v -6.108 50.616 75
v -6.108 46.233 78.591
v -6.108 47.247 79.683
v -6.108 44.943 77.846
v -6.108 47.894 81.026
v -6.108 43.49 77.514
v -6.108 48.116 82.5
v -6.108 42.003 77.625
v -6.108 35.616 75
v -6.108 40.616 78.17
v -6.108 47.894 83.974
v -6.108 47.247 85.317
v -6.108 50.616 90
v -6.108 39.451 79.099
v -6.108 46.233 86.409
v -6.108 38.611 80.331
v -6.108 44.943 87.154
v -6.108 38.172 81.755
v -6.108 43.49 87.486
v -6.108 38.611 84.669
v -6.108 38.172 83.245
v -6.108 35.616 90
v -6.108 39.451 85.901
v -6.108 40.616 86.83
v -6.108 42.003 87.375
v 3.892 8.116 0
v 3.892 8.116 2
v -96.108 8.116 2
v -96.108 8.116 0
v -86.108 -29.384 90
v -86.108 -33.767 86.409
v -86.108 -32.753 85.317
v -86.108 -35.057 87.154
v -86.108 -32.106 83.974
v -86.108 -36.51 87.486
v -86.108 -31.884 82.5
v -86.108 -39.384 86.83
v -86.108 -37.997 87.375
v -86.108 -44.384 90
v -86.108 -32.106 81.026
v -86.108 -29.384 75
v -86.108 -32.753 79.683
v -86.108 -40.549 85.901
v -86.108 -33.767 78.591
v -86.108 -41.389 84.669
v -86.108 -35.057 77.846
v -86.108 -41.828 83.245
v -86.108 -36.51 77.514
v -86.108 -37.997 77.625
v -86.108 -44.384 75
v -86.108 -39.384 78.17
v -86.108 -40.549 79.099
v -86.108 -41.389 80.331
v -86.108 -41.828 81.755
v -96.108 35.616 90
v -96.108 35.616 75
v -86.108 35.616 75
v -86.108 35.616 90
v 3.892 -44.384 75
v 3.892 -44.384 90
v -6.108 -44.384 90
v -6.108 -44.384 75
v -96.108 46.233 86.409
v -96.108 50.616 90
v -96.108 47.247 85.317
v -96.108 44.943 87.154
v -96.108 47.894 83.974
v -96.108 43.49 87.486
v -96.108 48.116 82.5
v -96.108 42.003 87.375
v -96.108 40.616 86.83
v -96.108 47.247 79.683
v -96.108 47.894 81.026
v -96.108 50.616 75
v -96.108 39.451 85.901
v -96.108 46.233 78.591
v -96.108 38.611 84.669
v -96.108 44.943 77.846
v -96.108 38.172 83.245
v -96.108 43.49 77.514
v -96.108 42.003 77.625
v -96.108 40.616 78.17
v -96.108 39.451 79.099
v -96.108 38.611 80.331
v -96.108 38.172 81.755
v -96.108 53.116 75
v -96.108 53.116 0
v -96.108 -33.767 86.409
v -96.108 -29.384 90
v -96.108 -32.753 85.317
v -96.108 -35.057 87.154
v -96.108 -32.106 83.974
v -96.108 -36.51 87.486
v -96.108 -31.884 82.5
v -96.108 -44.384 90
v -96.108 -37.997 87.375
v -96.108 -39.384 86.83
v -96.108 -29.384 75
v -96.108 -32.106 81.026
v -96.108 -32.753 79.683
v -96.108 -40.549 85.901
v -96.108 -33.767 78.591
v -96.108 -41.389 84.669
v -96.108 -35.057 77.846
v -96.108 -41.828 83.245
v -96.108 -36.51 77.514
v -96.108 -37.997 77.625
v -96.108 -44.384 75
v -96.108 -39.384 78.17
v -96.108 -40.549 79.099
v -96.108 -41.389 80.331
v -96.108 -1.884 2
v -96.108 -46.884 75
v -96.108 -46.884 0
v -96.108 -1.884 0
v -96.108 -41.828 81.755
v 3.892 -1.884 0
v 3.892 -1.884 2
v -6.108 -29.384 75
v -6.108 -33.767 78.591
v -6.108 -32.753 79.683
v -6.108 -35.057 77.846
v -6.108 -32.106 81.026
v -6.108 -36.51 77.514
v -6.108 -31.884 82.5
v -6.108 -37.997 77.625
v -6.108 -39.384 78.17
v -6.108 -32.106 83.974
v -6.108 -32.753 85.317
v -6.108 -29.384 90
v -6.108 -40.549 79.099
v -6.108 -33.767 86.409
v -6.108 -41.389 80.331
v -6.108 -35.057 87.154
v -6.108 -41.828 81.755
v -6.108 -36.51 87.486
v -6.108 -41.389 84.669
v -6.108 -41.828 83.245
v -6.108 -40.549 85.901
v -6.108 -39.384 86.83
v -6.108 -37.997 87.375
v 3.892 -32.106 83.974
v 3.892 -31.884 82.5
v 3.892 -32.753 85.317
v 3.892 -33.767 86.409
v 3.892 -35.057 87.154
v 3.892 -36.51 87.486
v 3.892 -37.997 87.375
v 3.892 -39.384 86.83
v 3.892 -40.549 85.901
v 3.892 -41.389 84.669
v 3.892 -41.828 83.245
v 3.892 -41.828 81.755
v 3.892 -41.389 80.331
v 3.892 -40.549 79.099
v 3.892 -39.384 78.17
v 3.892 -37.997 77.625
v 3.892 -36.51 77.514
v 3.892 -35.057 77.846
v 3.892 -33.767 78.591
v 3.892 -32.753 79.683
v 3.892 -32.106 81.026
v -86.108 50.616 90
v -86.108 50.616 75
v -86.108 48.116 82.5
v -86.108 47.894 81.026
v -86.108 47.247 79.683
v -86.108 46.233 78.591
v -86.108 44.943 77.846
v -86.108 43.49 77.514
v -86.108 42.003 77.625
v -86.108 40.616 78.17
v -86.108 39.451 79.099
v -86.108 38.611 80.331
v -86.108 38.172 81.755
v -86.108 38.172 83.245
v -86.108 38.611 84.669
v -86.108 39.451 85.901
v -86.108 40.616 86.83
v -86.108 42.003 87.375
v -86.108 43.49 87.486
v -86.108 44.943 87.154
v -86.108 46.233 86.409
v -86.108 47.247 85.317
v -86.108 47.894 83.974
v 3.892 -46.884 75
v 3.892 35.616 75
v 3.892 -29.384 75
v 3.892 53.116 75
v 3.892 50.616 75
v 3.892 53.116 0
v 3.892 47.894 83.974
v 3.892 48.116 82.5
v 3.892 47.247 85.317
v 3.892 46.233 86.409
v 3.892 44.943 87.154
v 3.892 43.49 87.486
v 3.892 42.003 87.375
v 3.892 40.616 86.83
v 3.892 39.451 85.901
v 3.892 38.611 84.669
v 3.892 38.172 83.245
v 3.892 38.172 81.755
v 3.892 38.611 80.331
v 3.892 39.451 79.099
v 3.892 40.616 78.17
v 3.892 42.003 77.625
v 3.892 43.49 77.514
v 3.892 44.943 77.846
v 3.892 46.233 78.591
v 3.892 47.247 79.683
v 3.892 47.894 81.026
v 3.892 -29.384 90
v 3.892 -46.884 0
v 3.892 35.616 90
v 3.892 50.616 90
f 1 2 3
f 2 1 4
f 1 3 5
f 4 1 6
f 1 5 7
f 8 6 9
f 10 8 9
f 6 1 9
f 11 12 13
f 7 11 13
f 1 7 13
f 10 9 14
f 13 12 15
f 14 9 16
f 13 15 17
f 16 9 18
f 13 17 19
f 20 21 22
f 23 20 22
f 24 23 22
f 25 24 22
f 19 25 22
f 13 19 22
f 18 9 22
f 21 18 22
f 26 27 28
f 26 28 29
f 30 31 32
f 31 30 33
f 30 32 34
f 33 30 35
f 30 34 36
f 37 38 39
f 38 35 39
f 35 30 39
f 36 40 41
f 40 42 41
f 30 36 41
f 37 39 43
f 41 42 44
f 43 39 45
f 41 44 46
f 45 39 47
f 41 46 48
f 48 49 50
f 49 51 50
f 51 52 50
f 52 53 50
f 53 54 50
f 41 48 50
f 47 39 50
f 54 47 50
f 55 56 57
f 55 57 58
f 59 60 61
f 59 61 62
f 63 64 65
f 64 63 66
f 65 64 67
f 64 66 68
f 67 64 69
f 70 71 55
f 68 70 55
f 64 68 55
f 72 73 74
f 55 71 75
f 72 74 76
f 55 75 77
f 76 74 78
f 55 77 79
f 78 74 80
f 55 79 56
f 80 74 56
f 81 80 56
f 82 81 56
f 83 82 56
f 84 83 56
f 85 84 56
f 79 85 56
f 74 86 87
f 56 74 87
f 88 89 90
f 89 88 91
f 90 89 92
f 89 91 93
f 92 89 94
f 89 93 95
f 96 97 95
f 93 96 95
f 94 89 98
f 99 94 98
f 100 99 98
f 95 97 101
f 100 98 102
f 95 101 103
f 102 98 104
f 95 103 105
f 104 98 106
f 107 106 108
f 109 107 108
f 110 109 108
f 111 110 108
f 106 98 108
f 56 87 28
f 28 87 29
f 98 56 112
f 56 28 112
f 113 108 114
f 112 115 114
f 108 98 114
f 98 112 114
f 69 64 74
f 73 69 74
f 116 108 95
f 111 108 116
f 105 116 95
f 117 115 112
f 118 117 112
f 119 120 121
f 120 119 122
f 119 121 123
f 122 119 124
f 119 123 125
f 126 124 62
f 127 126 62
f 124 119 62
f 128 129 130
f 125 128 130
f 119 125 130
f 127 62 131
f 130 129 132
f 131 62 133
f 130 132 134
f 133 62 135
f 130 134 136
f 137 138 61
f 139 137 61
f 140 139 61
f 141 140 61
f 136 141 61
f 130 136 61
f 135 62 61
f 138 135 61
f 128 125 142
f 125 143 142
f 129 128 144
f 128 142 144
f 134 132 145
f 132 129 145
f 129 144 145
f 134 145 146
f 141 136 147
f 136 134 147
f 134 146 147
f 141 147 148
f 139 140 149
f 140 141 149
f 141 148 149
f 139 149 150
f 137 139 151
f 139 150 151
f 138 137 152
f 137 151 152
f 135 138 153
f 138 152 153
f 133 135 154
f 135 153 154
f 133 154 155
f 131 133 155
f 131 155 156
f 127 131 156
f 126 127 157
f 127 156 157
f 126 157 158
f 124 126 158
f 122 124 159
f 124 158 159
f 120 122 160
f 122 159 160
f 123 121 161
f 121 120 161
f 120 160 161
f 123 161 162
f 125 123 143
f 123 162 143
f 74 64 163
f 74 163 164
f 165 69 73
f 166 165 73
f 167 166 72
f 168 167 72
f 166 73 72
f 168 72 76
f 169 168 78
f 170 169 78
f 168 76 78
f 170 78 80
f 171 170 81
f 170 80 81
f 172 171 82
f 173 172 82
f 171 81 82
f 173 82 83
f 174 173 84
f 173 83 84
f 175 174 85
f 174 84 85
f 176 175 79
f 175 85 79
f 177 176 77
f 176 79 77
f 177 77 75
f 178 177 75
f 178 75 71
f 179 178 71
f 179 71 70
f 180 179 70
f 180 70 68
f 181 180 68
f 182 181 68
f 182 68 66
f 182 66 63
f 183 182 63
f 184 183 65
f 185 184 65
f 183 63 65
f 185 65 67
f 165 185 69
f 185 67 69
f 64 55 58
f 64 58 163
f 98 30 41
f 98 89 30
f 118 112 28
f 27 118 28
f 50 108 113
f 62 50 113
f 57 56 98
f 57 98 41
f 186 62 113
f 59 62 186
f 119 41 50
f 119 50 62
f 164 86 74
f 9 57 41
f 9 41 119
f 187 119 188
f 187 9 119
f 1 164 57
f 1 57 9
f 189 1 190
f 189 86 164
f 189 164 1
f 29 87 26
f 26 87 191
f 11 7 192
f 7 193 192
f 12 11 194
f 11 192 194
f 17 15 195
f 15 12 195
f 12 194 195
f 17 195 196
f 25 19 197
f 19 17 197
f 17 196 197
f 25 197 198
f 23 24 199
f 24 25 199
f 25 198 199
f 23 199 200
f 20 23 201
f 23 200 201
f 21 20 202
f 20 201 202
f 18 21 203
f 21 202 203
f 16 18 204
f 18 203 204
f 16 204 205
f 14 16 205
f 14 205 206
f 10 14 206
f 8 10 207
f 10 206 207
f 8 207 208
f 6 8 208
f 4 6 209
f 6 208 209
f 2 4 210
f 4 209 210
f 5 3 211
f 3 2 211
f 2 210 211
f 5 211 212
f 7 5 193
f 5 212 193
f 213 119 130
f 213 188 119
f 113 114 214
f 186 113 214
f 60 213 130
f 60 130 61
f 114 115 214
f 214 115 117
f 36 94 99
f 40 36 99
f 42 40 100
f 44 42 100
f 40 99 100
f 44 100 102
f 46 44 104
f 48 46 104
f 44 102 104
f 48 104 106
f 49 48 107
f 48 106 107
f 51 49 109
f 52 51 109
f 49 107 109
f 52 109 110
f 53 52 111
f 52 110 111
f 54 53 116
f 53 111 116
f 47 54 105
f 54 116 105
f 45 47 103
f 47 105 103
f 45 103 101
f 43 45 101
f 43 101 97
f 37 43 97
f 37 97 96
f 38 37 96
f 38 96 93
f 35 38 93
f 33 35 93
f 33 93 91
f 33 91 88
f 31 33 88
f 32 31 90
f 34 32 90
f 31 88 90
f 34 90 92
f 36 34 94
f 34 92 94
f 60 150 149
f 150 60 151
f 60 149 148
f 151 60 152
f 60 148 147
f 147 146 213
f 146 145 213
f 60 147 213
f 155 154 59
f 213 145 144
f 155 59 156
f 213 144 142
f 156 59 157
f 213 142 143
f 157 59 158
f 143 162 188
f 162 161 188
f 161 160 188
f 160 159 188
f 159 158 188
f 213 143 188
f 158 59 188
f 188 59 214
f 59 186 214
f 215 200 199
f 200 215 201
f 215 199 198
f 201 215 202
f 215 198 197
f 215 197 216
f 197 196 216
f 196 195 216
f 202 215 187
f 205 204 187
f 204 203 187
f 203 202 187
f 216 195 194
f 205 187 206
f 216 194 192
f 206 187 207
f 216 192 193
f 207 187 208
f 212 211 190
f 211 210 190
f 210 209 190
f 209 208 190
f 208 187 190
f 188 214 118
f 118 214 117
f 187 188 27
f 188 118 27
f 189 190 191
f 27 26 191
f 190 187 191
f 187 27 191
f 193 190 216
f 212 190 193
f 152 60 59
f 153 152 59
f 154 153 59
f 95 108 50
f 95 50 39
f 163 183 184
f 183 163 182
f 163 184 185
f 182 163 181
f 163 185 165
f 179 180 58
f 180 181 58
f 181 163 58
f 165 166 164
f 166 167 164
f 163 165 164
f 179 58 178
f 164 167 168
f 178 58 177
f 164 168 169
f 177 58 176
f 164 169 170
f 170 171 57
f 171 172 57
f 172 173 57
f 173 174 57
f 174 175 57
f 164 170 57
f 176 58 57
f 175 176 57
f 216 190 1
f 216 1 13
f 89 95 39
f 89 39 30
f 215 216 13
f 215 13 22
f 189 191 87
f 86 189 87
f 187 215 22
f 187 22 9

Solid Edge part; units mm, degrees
sketch "Sketch1" plane through (0, 0, 0) normal (0, 0, 1) x (1, 0, 0)
  line L0 (-96.1079, -46.8841) -> (3.8921, -46.8841)
  line L1 (3.8921, -46.8841) -> (3.8921, 53.1159)
  line L2 (3.8921, 53.1159) -> (-96.1079, 53.1159)
  line L3 (-96.1079, 53.1159) -> (-96.1079, -46.8841)
  dimension "D1" = 100
  dimension "D2" = 100
extrude "Protrusion1" add sketch "Sketch1" along normal blind 75
sketch "Sketch2" plane through (-96.1079, 3.1159, 2.5) normal (-1, 0, 0) x (0, 1, 0)
  circle A0 centre (-40, -80) radius 5
  line L0 (32.5, -87.5) -> (47.5, -87.5)
  line L1 (47.5, -87.5) -> (47.5, -72.5)
  line L2 (47.5, -72.5) -> (32.5, -72.5)
  line L3 (32.5, -72.5) -> (32.5, -87.5)
  circle A1 centre (40, -80) radius 5
  line L4 (-47.5, -87.5) -> (-32.5, -87.5)
  line L5 (-32.5, -87.5) -> (-32.5, -72.5)
  line L6 (-32.5, -72.5) -> (-47.5, -72.5)
  line L7 (-47.5, -72.5) -> (-47.5, -87.5)
  dimension "D1" = 15
  dimension "D2" = 15
  dimension "D3" = 40
  dimension "D4" = 10
  dimension "D5" = 15
  dimension "D6" = 15
  dimension "D7" = 40
  dimension "D8" = 10
extrude "ExtrudedProtrusion_2" add sketch "Sketch2" against normal blind 10
mirror "Mirror1" about plane through (-46.1079, 0, 0) normal (1, 0, 0) of "ExtrudedProtrusion_2"
sketch "Sketch3" plane through (-96.1079, 3.1159, 10) normal (-1, 0, 0) x (0, -1, 0)
  line L0 (-5, -10) -> (5, -10)
  line L1 (5, -10) -> (5, -8)
  line L2 (5, -8) -> (-5, -8)
  line L3 (-5, -8) -> (-5, -10)
  dimension "D1" = 10
  dimension "D2" = 2
extrude "Cutout1" cut sketch "Sketch3" against normal through all
